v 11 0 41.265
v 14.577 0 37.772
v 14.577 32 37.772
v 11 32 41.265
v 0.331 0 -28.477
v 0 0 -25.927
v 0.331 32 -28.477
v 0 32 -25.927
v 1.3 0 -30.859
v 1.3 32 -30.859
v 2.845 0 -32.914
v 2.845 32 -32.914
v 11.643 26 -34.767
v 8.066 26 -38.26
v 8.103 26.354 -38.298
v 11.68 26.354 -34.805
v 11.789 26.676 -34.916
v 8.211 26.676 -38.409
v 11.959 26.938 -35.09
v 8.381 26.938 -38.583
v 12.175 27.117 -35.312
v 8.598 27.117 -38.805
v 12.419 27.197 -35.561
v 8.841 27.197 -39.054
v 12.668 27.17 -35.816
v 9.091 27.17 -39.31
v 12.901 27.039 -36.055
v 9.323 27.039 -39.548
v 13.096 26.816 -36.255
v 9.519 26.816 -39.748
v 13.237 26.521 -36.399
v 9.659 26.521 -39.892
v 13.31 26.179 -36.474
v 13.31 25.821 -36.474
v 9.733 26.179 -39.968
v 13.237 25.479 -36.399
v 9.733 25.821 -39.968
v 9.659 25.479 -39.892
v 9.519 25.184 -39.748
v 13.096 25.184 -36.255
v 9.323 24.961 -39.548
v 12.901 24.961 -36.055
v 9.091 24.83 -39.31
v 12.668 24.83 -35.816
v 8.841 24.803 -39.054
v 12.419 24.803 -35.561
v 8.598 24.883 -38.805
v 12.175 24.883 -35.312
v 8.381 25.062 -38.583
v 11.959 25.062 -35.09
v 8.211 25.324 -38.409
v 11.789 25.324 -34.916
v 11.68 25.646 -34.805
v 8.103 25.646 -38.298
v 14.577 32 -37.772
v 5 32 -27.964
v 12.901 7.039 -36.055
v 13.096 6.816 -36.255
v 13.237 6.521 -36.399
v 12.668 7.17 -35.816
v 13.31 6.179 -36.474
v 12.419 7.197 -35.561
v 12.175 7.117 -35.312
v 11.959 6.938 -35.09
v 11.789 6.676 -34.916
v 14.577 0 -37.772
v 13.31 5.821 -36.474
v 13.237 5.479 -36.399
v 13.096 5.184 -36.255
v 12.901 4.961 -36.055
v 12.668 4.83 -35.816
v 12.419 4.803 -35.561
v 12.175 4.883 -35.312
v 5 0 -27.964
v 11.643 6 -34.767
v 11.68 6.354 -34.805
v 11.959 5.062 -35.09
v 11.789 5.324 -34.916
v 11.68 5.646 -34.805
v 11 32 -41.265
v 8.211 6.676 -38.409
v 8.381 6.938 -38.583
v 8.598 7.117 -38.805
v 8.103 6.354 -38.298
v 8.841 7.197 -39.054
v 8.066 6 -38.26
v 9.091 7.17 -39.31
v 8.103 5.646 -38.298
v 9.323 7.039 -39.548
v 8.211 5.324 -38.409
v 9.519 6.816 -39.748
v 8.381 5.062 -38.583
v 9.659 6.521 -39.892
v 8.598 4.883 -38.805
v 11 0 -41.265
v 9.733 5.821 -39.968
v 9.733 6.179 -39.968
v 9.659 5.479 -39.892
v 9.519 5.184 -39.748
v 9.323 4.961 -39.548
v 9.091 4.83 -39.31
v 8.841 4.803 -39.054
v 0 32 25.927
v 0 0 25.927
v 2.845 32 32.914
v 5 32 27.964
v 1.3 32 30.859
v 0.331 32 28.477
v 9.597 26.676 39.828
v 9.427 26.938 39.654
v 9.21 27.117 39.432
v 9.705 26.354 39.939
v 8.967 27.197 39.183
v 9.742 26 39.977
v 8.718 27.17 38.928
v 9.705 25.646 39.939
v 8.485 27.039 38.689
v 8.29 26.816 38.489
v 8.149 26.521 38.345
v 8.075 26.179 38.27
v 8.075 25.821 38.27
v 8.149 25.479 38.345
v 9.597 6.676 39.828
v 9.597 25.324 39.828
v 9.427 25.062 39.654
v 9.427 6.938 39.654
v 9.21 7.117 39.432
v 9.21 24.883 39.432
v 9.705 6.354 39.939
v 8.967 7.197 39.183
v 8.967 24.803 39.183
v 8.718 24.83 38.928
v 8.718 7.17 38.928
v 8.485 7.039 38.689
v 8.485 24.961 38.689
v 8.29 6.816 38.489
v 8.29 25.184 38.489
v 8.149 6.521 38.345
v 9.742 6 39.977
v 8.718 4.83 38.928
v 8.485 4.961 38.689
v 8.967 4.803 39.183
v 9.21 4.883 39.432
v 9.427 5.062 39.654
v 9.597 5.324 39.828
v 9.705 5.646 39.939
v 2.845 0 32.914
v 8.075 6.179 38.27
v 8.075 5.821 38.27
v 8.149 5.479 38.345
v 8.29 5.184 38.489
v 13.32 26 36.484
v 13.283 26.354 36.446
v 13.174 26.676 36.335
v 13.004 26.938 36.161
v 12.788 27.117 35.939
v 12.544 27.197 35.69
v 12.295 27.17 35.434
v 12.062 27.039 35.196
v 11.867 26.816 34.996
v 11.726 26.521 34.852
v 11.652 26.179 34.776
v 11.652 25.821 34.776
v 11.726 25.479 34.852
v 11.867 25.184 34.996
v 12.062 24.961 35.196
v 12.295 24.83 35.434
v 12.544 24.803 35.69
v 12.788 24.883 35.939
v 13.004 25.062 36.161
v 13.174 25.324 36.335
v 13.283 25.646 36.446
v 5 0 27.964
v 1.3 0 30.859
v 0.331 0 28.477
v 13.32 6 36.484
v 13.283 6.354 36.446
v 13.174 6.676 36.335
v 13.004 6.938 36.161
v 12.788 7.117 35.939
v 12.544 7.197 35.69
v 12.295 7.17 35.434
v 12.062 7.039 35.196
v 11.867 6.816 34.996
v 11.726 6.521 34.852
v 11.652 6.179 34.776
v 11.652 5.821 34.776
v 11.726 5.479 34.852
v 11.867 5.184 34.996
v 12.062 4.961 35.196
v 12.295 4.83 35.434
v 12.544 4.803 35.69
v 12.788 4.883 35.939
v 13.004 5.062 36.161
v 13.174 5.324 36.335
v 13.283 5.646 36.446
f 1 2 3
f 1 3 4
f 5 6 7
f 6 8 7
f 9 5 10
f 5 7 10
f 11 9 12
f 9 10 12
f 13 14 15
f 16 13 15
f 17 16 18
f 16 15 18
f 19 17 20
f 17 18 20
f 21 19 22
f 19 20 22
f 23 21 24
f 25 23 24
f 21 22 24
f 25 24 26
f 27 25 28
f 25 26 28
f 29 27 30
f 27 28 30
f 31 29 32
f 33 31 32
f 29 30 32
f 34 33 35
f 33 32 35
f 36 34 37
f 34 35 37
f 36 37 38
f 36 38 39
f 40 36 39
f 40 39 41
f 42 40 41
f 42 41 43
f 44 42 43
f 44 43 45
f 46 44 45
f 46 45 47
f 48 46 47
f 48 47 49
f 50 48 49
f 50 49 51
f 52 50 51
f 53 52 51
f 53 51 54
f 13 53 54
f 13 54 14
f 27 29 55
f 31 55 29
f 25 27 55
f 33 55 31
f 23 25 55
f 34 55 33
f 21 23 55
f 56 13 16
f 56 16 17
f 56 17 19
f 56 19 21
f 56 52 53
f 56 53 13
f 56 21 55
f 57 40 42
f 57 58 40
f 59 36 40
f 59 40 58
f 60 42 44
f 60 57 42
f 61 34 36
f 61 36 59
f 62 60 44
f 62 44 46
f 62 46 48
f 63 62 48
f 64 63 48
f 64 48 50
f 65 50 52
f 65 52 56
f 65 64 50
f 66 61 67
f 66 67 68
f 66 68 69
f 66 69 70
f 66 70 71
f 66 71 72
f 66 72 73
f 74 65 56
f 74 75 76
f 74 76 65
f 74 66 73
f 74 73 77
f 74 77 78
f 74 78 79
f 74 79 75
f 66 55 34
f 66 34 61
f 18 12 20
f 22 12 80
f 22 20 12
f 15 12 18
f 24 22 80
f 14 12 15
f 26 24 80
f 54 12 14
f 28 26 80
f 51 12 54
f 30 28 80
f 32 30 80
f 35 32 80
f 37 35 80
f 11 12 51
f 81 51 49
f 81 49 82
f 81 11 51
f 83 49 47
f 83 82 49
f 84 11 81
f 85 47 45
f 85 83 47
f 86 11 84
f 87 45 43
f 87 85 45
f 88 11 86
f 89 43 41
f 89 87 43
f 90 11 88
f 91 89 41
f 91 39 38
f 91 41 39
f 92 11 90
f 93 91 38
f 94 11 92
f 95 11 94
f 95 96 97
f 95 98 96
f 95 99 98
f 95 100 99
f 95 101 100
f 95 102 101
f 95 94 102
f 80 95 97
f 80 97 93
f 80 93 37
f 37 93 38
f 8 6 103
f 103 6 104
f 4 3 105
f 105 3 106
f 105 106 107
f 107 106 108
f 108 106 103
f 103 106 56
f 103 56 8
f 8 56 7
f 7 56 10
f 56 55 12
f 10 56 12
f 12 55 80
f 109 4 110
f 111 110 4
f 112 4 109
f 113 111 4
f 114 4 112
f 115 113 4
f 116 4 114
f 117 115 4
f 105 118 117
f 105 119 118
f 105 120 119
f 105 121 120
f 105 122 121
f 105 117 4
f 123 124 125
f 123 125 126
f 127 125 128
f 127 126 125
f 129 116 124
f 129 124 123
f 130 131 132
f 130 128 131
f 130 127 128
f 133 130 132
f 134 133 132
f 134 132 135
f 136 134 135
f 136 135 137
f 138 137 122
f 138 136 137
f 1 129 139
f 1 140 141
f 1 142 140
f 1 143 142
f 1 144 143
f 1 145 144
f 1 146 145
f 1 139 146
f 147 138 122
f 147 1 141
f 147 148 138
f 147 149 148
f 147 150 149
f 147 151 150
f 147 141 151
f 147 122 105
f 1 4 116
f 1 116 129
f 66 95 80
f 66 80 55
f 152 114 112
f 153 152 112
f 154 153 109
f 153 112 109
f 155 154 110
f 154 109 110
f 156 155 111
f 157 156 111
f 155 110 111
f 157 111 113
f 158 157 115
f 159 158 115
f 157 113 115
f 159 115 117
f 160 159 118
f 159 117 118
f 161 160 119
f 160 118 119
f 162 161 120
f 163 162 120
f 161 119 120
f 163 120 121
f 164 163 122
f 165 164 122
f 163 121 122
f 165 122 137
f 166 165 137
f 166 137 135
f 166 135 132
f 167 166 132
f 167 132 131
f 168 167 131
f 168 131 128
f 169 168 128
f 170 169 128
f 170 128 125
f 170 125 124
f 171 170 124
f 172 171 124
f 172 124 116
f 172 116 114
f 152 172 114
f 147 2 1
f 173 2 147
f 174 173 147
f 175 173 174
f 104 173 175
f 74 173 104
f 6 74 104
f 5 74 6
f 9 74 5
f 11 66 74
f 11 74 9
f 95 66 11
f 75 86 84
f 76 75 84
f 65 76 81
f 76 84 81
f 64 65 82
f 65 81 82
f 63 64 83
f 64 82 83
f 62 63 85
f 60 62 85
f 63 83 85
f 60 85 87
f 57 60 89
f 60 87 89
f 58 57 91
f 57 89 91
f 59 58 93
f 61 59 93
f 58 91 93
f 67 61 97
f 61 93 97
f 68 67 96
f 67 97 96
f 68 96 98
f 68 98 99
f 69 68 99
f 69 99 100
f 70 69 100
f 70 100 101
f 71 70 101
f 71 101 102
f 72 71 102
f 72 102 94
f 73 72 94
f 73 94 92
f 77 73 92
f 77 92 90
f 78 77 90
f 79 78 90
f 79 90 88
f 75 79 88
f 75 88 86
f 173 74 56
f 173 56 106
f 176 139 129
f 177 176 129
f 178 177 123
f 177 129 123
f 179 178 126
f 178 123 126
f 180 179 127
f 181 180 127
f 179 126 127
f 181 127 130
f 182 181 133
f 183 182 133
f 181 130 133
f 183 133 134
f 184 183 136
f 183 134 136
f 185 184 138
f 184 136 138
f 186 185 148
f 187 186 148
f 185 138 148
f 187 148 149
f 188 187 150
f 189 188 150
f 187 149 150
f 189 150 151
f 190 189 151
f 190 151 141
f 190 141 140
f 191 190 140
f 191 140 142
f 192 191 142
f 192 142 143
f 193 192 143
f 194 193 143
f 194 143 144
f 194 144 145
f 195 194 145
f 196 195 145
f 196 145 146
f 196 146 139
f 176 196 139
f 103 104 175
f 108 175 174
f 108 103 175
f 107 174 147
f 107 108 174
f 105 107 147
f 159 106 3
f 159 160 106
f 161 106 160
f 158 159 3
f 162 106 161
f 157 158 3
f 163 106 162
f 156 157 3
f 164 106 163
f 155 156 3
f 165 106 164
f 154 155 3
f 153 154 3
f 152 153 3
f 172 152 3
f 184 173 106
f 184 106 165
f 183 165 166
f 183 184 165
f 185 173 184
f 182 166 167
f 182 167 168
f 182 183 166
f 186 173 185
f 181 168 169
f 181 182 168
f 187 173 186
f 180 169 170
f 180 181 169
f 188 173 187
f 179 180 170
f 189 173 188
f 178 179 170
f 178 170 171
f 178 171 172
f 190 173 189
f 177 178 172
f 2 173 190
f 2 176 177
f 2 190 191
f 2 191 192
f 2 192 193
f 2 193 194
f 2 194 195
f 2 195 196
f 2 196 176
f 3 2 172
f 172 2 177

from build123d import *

# Parameters (mm, degrees)
BOSS_EXTRUDE1_DEPTH = 32
FILLET1_R           = 10
SKETCH4_W           = 170.11041037
SKETCH4_H           = 258.008077424
CUT_EXTRUDE2_DEPTH  = 33
SKETCH6_R           = 1.2
CUT_EXTRUDE3_DEPTH  = 61.218304139
SKETCH7_R           = 1.2
CUT_EXTRUDE4_DEPTH  = 61.218304139


with BuildPart() as part:
    # Sketch1 → Boss-Extrude1 (new body)
    with BuildSketch(Plane(origin=(0, 0, 0), x_dir=(1, 0, 0), z_dir=(0, 1, 0))):
        Polygon((0, 0), (0, 30), (83, 115), (83, 107.843231513), (5, 27.963713441), (5, -27.963713441), (83, -107.843231513), (83, -115), (0, -30), align=None)
    extrude(amount=BOSS_EXTRUDE1_DEPTH)

    # Fillet1
    fillet1_edges = [part.edges().sort_by_distance(p)[0] for p in [
        (0, 16, 30),
        (0, 16, -30),
    ]]
    fillet(fillet1_edges, radius=FILLET1_R)

    # Sketch4 → Cut-Extrude2 (cut, through all)
    with BuildSketch(Plane(origin=(0, 32, 0), x_dir=(1, 0, 0), z_dir=(0, 1, 0))):
        with Locations((35.635219957, -4.046970822)):
            Rectangle(SKETCH4_W, SKETCH4_H)
        Polygon((14.577370106, -37.771863549), (11, -41.265060241), (0, -41.265060241), (0, 41.265060241), (11, 41.265060241), (14.577370106, 37.771863549), align=None, mode=Mode.SUBTRACT)
    extrude(amount=-CUT_EXTRUDE2_DEPTH, mode=Mode.SUBTRACT)

    # Sketch6 → Cut-Extrude3 (cut, through all)
    with BuildSketch(Plane(origin=(-14.995748902, 0, -14.642907751), x_dir=(-0.698639338, 0, 0.715474021), z_dir=(-0.715474021, 0, -0.698639338))):
        with Locations((-34.209111306, 26)):
            Circle(SKETCH6_R)
        with Locations((-34.209111306, 6)):
            Circle(SKETCH6_R)
    extrude(amount=-CUT_EXTRUDE3_DEPTH, mode=Mode.SUBTRACT)

    # Sketch7 → Cut-Extrude4 (cut, through all)
    with BuildSketch(Plane(origin=(-14.995748902, 0, 14.642907751), x_dir=(0.698639338, 0, 0.715474021), z_dir=(-0.715474021, 0, 0.698639338))):
        with Locations((34.209111306, 26)):
            Circle(SKETCH7_R)
        with Locations((34.209111306, 6)):
            Circle(SKETCH7_R)
    extrude(amount=-CUT_EXTRUDE4_DEPTH, mode=Mode.SUBTRACT)


solid = part.part
